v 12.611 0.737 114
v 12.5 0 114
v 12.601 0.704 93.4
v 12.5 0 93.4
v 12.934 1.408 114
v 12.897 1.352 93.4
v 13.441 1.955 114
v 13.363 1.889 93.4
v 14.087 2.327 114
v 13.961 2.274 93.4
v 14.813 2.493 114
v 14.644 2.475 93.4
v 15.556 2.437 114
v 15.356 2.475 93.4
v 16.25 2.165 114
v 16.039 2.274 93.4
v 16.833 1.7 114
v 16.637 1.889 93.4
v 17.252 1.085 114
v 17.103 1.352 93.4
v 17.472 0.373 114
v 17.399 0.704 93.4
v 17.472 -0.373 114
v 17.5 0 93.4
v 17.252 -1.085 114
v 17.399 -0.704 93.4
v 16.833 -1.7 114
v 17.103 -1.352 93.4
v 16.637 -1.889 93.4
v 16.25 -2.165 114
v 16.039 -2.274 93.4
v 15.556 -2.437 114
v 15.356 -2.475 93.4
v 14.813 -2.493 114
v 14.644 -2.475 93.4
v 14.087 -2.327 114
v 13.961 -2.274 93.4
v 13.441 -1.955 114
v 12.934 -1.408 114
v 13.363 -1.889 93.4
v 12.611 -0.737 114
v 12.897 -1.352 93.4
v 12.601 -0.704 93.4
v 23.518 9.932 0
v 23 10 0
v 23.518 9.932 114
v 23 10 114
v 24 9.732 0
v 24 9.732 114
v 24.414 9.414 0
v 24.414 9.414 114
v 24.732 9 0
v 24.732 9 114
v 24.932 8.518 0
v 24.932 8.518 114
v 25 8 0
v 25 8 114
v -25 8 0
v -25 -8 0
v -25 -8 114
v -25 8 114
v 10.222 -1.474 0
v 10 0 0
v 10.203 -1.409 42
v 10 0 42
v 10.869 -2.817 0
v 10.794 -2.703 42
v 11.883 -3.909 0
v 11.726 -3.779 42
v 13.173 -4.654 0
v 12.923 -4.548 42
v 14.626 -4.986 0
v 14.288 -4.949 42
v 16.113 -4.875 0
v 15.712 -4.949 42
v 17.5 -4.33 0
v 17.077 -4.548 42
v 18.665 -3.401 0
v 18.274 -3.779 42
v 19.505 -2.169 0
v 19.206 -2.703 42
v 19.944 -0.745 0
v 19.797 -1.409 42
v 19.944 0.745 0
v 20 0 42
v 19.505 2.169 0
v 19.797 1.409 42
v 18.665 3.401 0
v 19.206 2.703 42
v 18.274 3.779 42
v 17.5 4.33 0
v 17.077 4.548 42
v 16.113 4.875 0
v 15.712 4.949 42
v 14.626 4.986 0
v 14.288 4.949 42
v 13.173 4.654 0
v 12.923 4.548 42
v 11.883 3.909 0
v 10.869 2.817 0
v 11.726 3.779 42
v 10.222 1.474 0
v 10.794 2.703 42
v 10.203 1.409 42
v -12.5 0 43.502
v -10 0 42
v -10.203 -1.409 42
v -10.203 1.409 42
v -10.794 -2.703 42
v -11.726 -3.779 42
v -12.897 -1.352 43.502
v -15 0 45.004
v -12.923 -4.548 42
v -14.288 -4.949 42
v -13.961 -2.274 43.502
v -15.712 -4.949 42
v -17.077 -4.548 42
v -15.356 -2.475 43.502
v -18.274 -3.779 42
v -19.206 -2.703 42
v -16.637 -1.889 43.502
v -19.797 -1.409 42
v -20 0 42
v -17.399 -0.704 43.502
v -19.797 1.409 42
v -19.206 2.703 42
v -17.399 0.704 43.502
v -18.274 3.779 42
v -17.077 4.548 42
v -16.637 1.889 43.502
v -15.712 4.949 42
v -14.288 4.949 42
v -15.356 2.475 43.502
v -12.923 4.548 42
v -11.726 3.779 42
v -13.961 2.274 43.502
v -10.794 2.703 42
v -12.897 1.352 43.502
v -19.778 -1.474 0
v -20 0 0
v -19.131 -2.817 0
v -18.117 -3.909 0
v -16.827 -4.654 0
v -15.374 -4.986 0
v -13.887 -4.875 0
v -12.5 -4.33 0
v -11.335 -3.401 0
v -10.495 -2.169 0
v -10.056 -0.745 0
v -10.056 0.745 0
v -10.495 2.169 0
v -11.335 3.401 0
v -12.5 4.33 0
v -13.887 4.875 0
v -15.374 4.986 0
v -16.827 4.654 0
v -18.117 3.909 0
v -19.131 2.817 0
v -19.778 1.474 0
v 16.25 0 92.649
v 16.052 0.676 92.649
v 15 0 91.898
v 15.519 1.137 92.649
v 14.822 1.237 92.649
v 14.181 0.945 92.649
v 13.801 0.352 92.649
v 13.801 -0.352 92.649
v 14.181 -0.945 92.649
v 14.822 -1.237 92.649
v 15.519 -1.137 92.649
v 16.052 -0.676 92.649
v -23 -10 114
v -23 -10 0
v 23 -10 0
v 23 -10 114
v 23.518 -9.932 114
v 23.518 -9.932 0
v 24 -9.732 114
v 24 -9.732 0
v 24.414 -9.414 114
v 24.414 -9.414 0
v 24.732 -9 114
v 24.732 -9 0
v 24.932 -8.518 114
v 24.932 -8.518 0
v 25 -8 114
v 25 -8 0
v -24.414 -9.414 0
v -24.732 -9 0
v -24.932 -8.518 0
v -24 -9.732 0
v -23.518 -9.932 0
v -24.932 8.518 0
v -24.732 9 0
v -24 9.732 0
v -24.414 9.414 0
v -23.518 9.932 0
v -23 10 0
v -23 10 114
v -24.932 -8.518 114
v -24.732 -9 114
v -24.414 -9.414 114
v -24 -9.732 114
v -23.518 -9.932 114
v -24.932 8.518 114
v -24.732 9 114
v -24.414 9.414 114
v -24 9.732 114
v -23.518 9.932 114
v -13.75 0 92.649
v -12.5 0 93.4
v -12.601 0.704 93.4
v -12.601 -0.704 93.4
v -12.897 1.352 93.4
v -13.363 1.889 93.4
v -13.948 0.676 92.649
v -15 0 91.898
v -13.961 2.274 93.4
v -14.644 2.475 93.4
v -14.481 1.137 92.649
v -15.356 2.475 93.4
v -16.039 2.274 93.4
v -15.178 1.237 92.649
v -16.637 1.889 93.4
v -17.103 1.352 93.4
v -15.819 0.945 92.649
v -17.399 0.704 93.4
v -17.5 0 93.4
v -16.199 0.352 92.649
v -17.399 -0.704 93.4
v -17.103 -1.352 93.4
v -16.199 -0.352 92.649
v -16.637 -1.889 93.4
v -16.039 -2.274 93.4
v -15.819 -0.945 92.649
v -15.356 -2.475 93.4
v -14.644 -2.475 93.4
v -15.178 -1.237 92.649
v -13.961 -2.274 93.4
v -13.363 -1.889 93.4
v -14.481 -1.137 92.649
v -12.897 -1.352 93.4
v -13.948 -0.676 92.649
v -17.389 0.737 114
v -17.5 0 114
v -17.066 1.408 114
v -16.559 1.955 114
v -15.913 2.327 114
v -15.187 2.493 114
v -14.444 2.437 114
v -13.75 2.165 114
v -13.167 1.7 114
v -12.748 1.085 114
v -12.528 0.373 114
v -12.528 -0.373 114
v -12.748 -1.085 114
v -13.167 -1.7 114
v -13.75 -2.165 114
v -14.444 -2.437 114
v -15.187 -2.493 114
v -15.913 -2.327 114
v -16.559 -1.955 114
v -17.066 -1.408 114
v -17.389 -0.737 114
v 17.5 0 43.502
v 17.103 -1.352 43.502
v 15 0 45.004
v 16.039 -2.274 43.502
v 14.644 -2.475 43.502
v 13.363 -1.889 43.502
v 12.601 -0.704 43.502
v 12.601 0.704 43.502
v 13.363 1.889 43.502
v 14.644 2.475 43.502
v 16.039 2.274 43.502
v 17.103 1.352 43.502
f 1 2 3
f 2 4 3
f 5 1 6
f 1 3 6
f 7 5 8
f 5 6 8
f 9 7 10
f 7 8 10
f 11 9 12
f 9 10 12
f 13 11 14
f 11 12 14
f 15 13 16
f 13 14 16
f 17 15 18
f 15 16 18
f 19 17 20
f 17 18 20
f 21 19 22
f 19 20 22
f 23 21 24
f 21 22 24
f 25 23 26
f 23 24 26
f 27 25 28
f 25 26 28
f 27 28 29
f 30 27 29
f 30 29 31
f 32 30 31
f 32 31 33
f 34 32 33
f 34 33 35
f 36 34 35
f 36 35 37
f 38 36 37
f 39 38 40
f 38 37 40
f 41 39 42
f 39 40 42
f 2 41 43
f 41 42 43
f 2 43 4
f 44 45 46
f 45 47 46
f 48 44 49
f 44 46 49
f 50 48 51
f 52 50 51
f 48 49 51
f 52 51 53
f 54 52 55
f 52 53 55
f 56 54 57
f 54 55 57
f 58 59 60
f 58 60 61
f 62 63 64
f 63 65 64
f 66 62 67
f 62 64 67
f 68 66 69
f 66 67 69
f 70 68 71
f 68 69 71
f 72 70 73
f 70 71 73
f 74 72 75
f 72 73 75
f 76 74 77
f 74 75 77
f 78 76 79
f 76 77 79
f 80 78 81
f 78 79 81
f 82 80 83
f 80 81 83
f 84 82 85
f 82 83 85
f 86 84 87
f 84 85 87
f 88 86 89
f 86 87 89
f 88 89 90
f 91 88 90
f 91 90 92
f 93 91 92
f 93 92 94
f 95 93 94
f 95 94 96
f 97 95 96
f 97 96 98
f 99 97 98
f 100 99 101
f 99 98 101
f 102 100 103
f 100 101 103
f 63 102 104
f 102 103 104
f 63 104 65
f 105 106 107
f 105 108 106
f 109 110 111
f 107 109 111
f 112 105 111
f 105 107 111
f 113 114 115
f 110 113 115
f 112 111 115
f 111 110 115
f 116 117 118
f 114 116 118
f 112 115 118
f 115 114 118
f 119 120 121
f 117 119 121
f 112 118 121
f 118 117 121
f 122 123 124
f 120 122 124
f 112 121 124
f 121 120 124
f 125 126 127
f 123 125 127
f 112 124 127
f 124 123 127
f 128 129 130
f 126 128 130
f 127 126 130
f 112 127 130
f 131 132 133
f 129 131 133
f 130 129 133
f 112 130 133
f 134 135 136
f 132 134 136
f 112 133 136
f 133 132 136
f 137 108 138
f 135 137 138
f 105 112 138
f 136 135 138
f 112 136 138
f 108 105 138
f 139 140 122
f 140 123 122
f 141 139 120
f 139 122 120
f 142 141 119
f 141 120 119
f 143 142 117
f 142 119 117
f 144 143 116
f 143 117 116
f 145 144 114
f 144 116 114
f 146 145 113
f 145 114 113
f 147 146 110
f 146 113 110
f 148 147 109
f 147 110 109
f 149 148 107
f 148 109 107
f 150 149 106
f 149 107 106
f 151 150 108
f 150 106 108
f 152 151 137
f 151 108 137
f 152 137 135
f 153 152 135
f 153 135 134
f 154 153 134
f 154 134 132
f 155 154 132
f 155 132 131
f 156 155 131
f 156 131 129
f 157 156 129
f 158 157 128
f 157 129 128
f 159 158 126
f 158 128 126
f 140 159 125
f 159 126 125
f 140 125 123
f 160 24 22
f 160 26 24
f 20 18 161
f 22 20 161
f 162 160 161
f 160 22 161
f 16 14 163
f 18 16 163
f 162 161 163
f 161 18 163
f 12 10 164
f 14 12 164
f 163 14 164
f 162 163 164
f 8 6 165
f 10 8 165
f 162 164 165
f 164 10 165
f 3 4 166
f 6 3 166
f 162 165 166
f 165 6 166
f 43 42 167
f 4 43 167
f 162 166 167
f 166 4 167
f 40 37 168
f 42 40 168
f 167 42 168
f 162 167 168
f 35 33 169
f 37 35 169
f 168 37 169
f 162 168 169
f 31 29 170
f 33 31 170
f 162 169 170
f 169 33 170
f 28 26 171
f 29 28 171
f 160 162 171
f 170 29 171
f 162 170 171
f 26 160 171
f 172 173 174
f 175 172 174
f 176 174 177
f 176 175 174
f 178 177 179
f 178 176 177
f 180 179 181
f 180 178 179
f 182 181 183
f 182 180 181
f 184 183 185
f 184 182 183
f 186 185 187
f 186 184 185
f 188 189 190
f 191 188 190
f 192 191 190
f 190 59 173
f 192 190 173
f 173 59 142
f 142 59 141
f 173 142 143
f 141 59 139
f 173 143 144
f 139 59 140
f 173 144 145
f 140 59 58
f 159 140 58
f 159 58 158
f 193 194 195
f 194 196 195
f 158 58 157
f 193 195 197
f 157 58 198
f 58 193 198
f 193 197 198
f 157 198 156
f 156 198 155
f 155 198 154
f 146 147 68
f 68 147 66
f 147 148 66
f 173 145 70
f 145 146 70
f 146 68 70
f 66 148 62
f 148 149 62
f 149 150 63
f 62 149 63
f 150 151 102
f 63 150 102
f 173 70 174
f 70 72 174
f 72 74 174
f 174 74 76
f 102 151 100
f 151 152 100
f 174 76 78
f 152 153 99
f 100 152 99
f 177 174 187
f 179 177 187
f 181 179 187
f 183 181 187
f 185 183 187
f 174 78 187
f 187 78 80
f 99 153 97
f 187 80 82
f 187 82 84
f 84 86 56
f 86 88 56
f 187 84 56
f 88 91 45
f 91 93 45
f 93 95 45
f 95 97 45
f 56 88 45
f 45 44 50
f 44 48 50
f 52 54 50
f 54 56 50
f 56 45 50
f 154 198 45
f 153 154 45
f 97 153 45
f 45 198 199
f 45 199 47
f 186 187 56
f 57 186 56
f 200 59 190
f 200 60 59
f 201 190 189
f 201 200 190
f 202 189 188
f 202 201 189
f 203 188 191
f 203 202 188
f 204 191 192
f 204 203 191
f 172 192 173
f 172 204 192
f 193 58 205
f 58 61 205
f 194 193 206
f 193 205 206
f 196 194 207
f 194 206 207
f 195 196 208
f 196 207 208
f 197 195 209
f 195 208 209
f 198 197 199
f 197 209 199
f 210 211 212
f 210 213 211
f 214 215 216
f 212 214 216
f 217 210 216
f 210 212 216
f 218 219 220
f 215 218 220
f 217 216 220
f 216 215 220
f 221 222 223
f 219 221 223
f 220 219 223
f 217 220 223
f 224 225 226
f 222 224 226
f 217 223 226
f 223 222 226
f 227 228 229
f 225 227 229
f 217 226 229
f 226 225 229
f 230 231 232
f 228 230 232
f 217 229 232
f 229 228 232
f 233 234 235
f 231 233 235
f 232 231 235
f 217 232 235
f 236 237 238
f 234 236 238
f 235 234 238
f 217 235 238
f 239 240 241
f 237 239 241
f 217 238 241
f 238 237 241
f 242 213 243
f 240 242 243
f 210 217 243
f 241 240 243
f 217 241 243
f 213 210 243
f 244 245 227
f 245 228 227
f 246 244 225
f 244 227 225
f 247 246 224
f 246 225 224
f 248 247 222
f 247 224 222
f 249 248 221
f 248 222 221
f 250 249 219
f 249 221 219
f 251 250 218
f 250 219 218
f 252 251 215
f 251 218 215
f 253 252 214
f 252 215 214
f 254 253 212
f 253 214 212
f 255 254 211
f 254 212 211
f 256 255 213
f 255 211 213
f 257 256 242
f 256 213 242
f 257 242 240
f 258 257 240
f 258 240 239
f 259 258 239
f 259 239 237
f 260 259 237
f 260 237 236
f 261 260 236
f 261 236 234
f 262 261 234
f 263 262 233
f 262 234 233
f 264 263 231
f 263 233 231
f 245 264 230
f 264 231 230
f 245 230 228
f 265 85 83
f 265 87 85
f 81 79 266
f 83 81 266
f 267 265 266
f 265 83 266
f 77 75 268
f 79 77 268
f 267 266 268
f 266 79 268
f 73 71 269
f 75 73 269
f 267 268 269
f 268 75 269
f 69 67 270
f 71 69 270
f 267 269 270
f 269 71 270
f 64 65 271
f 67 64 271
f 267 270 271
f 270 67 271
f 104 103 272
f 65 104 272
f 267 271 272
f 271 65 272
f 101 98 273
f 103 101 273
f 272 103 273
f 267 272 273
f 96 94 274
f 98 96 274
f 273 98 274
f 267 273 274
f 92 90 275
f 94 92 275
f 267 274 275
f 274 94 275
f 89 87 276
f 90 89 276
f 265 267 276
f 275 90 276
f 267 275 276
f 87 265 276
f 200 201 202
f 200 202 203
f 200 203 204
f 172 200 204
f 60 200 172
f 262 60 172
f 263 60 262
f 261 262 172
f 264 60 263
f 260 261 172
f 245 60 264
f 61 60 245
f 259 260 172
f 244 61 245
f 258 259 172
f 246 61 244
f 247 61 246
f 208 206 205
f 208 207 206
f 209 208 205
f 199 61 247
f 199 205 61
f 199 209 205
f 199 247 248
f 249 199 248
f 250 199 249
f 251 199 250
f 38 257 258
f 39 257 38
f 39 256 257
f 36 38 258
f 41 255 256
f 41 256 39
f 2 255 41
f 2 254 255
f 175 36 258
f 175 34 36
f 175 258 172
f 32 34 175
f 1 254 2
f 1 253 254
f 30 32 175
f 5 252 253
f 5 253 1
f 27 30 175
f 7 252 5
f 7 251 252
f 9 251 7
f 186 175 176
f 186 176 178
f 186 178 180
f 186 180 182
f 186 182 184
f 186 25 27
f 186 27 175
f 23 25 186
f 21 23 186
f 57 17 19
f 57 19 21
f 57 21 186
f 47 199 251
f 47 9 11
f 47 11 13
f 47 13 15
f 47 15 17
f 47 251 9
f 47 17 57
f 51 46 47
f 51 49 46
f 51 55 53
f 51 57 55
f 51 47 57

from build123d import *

# Parameters (mm, degrees)
F0_W     = 50
F0_H     = 20
F1_DEPTH = 114
F3_D     = 5
F3_DEPTH = 20.6
F3_TIP   = 1.5021515476
F5_D     = 10
F5_DEPTH = 42
F5_TIP   = 3.0043030951
F6_R     = 2


with BuildPart() as f1:
    # F0 (on Top) → F1 (new body)
    with BuildSketch(Plane.XY):
        Rectangle(F0_W, F0_H)
    extrude(amount=F1_DEPTH)

    # F3
    with Locations(Plane.XY.offset(114)):
        with Locations((-15, 0), (15, 0)):
            Hole(F3_D / 2, depth=F3_DEPTH)
            with Locations((0, 0, -(F3_DEPTH + F3_TIP / 2))):  # 118° drill point
                Cone(0, F3_D / 2, F3_TIP, mode=Mode.SUBTRACT)

    # F5
    with Locations(Plane(origin=(0, 0, 0), x_dir=(1, 0, 0), z_dir=(0, 0, -1))):
        with Locations((-15, 0), (15, 0)):
            Hole(F5_D / 2, depth=F5_DEPTH)
            with Locations((0, 0, -(F5_DEPTH + F5_TIP / 2))):  # 118° drill point
                Cone(0, F5_D / 2, F5_TIP, mode=Mode.SUBTRACT)

    # F6
    f6_edges = [f1.edges().sort_by_distance(p)[0] for p in [
        (25, -10, 57),
        (-25, -10, 57),
        (-25, 10, 57),
        (25, 10, 57),
    ]]
    fillet(f6_edges, radius=F6_R)


solid = f1.part
